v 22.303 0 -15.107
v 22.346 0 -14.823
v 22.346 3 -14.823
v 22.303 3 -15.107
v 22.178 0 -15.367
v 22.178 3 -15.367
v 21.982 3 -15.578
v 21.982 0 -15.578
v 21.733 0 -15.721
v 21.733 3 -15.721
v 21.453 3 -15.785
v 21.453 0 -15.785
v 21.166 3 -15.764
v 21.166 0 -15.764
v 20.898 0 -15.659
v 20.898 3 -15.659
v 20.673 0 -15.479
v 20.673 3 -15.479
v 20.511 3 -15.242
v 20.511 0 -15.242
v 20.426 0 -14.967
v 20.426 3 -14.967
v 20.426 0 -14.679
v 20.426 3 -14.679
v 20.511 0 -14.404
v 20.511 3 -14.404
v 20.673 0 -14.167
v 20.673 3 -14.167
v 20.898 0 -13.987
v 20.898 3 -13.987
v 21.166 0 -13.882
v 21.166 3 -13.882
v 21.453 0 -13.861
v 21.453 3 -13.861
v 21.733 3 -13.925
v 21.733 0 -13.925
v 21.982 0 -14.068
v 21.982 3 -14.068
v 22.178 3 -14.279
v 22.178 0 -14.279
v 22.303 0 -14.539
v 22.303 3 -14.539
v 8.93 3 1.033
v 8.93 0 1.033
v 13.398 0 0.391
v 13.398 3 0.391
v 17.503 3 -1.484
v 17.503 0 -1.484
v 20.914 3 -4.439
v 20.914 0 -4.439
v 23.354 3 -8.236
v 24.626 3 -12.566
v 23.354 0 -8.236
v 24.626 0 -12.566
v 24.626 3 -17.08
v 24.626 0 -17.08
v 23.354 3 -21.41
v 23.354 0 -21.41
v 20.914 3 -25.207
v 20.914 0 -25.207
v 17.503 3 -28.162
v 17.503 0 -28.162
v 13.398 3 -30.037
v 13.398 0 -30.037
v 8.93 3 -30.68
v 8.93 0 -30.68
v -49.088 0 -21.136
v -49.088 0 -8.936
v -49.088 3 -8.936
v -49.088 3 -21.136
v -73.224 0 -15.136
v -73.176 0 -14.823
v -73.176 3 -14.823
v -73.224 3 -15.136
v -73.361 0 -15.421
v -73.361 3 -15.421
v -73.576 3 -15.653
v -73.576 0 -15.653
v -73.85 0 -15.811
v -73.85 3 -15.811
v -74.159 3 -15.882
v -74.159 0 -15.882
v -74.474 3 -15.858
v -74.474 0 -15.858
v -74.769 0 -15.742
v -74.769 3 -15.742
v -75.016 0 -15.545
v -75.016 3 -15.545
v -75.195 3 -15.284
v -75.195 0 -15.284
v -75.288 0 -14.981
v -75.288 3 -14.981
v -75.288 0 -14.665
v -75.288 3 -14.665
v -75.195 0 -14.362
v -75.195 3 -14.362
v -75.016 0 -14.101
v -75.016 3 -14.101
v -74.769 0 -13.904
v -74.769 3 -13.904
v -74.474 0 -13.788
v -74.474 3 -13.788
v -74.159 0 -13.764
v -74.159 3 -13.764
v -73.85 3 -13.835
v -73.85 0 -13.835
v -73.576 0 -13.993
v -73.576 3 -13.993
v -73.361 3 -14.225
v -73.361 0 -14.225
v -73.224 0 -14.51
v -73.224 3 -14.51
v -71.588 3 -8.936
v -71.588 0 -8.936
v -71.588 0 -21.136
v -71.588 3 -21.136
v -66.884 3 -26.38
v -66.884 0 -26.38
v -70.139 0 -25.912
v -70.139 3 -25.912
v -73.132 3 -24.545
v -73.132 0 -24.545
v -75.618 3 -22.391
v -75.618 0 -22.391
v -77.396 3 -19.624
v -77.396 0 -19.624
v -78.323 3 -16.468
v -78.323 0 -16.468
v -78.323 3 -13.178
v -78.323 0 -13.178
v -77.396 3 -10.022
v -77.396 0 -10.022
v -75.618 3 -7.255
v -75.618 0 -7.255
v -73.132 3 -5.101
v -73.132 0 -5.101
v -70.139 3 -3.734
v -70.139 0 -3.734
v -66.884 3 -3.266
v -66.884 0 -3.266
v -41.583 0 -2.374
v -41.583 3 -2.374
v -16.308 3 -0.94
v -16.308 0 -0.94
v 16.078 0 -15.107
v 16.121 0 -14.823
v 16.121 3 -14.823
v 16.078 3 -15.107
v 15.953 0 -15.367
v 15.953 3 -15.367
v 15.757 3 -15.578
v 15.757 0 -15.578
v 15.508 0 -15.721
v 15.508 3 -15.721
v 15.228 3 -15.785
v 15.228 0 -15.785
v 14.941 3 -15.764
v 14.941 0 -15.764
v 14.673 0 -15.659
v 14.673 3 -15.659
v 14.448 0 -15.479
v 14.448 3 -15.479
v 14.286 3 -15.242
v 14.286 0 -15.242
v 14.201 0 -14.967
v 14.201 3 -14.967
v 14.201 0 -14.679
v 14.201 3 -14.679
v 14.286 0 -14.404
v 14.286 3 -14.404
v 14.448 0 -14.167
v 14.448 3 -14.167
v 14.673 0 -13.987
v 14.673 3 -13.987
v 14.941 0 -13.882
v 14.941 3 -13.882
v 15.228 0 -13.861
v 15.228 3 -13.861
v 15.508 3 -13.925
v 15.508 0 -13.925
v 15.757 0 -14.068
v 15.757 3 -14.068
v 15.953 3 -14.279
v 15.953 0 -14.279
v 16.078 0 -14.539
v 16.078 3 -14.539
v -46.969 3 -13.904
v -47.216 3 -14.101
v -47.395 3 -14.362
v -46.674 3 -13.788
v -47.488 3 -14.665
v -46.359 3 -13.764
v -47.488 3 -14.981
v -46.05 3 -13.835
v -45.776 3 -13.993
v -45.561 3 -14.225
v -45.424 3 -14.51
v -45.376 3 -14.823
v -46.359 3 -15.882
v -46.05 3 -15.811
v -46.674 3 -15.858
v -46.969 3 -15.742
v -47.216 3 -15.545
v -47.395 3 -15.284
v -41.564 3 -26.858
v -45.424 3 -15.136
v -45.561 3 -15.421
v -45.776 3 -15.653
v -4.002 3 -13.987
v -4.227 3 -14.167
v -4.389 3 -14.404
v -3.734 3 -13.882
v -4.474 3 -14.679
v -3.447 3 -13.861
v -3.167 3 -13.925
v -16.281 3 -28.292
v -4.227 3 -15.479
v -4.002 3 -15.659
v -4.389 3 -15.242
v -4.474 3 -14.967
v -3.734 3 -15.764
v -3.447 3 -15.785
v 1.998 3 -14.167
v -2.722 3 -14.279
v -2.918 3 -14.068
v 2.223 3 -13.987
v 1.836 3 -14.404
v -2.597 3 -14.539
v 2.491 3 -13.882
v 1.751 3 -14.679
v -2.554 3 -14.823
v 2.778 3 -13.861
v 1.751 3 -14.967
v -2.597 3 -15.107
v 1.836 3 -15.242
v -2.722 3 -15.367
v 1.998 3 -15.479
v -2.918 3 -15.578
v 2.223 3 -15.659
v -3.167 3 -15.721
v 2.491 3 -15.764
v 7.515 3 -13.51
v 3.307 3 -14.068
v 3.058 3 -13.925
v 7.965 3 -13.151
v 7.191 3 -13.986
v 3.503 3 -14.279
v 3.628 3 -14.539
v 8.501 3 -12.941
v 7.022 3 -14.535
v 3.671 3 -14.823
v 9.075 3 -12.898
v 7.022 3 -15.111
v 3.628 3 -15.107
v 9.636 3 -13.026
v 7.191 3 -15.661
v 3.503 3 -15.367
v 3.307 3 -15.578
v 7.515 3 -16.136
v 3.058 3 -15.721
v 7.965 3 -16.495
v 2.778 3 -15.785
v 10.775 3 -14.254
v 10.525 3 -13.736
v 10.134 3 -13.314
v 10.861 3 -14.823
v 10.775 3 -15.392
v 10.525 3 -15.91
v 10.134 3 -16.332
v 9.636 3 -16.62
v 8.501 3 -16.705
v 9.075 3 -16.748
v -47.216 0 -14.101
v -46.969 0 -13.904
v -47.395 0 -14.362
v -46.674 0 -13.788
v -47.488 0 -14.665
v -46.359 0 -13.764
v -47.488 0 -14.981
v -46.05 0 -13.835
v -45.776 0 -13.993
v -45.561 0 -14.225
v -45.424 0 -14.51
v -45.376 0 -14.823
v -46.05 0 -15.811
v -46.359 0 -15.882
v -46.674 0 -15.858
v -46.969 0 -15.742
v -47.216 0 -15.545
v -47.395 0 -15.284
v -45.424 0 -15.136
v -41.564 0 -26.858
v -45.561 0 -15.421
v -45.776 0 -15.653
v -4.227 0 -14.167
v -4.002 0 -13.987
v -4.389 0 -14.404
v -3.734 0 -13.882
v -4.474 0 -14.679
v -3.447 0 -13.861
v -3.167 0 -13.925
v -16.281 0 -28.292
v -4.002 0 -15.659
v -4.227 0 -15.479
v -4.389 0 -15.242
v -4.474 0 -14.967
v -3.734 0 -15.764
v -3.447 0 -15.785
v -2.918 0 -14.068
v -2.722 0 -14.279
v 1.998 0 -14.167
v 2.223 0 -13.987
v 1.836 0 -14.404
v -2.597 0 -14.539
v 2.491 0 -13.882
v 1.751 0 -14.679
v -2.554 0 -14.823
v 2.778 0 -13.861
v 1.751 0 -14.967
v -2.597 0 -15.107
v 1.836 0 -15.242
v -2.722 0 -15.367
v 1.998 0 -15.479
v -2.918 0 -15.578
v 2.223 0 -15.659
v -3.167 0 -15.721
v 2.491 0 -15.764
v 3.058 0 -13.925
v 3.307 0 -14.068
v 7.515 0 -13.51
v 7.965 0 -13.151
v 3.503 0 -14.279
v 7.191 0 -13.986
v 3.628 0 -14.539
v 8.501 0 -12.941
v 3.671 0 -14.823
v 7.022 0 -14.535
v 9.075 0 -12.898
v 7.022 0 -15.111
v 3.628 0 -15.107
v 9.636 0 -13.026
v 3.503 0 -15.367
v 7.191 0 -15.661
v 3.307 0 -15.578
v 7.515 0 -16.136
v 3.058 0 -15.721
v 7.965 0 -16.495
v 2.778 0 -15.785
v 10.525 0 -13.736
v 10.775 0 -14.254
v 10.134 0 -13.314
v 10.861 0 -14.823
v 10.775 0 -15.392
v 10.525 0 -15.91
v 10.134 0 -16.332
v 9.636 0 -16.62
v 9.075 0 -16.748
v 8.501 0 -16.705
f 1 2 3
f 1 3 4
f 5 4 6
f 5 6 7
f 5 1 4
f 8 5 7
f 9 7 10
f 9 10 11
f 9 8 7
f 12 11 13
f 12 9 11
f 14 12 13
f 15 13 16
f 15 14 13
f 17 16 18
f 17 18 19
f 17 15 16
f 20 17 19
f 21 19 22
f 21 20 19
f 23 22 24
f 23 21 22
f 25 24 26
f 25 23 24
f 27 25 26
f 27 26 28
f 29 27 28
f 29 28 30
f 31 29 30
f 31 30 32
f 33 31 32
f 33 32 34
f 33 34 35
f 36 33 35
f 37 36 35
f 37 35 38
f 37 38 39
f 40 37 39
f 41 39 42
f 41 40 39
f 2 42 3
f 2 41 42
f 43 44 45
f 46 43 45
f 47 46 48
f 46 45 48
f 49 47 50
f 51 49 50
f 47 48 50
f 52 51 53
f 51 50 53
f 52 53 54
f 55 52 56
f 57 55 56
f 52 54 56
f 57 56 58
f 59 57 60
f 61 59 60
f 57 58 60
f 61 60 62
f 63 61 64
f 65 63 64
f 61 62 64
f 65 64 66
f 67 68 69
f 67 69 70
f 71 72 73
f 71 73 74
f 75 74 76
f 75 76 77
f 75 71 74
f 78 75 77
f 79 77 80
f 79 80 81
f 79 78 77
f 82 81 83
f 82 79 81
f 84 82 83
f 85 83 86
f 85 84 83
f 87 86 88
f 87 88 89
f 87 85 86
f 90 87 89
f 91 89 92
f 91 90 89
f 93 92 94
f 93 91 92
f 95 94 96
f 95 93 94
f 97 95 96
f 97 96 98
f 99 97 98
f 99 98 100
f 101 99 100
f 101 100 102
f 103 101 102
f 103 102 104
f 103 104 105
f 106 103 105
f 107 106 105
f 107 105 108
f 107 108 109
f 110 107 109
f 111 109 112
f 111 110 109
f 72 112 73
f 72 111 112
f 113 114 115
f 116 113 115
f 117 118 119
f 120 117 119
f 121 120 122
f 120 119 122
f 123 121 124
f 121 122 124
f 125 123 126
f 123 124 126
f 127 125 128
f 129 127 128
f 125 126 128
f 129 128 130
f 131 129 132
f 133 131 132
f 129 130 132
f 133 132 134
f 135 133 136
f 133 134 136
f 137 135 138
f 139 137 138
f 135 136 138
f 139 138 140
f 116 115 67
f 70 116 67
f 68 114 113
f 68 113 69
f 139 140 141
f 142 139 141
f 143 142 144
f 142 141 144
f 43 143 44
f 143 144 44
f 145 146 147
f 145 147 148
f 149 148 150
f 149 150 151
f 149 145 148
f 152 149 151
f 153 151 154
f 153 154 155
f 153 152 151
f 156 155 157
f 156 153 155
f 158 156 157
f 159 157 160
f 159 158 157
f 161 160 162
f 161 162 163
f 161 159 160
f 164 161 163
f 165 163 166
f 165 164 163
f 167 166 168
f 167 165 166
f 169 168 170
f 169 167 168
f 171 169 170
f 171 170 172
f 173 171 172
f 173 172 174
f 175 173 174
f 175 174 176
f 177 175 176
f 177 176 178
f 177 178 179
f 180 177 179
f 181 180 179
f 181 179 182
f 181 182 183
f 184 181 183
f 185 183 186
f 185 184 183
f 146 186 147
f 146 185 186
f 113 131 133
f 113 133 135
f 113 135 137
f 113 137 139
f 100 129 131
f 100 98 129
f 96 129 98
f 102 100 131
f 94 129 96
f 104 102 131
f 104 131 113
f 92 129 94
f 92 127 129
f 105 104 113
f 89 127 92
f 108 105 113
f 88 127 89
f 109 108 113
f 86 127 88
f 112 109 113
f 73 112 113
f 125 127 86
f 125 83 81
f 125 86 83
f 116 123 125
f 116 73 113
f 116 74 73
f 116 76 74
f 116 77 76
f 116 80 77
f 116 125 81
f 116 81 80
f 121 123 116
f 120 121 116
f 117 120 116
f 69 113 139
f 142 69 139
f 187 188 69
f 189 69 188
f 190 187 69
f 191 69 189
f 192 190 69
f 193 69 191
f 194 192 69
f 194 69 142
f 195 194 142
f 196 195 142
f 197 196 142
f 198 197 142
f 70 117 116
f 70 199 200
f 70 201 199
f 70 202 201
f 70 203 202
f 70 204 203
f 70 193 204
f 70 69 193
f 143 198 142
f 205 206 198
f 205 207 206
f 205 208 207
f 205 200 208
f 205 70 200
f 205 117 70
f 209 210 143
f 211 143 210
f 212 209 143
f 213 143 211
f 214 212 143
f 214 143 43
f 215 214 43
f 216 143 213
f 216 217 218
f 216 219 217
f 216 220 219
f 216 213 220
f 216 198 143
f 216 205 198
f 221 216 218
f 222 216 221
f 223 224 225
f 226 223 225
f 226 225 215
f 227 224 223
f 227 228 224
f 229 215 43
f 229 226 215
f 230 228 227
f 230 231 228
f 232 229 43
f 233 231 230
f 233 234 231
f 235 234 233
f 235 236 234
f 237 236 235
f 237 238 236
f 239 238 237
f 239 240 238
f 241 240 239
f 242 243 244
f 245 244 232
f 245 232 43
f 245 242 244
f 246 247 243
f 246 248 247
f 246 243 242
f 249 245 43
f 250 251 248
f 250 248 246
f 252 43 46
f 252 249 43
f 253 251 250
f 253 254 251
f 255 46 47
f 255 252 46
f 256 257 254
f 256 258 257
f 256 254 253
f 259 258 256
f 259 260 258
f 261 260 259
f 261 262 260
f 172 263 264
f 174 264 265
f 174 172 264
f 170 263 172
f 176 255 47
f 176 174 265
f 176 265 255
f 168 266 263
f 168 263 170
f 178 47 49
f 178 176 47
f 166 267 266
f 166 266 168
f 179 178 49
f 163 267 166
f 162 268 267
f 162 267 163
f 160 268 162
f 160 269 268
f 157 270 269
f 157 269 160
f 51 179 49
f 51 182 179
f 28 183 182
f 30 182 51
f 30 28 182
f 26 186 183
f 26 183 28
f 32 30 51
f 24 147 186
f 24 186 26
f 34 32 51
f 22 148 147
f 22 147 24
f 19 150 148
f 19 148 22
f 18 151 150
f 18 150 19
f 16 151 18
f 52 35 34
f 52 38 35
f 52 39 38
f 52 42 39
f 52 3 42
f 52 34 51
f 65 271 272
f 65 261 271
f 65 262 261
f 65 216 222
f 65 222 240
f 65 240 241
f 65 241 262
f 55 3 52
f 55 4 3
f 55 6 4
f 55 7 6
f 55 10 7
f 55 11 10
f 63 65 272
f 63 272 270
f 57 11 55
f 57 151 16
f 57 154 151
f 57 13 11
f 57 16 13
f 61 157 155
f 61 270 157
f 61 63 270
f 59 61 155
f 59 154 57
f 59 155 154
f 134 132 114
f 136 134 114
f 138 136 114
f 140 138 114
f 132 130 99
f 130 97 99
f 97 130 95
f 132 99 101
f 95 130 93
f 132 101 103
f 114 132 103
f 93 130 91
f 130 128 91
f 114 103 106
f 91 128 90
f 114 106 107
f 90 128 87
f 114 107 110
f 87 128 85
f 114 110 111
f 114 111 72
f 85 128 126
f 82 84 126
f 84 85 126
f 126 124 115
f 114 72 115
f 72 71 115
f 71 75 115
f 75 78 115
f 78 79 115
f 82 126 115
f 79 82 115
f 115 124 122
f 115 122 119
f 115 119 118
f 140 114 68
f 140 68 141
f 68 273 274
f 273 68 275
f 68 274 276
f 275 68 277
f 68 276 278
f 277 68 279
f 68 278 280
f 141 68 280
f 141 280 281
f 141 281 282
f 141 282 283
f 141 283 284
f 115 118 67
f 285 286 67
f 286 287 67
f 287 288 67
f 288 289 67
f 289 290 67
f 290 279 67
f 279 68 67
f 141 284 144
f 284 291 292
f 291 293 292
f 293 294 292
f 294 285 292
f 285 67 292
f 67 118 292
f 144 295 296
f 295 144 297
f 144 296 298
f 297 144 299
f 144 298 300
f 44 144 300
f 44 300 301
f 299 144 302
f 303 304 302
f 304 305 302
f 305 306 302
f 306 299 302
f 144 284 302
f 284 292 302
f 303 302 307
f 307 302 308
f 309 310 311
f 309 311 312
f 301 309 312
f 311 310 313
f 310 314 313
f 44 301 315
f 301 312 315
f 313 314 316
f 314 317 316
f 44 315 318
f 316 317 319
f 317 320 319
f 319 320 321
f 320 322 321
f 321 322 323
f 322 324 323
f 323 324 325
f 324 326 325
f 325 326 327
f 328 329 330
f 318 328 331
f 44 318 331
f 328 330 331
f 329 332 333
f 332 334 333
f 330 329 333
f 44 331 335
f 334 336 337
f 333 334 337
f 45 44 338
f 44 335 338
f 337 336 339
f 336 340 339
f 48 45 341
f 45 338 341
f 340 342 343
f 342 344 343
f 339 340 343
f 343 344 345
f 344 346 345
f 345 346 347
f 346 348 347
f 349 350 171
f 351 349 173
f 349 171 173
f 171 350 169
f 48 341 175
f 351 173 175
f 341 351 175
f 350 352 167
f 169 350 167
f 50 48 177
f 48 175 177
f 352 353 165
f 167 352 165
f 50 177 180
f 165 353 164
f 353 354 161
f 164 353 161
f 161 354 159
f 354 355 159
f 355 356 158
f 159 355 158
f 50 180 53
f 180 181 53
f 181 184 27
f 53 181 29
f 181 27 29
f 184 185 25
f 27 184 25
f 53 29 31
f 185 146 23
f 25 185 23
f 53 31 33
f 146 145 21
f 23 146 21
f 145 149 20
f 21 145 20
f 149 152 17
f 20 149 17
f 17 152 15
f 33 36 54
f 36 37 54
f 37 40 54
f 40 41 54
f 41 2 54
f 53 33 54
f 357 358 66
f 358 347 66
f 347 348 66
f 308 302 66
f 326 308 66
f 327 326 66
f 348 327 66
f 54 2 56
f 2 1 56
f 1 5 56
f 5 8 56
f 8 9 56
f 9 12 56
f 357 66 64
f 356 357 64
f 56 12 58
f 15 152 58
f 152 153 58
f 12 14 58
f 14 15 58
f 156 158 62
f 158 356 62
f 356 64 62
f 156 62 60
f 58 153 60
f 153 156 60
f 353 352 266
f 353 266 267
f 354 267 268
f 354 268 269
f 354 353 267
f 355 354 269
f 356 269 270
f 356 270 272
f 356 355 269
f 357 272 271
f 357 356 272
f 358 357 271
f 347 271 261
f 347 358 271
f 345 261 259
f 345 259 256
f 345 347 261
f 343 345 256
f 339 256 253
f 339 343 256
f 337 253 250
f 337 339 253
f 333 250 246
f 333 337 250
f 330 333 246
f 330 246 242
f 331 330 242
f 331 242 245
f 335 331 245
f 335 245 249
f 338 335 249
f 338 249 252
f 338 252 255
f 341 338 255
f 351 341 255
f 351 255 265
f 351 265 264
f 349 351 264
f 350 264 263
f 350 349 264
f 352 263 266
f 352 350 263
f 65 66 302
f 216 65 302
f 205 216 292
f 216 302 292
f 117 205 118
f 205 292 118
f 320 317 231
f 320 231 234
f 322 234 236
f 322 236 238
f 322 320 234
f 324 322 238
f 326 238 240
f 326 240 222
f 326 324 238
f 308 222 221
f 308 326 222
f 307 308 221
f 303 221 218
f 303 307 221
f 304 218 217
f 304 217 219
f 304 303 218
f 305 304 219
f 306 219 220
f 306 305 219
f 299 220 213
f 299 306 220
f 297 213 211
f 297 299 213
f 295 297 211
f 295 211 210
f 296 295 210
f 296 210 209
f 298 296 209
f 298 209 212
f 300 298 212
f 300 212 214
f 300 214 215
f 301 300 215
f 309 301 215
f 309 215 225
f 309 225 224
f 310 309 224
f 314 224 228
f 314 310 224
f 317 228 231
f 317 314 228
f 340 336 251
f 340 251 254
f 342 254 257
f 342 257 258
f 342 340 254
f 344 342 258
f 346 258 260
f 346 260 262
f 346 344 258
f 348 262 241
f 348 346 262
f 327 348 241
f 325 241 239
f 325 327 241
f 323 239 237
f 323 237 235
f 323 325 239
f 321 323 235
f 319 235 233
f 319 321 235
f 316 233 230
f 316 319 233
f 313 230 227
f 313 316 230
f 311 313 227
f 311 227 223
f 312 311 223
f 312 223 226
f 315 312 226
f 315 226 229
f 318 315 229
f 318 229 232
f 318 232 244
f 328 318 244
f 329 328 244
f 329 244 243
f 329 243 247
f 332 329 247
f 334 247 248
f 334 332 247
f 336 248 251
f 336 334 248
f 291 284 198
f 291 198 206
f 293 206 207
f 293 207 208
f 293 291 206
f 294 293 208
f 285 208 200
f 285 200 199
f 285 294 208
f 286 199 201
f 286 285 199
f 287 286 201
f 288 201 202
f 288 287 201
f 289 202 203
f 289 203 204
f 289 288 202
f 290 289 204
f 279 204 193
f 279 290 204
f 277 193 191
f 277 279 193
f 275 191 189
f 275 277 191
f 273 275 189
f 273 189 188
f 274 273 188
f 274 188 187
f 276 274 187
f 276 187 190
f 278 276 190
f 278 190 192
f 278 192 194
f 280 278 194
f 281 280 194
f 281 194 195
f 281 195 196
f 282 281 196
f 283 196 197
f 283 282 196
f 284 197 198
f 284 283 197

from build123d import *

# Parameters (mm, degrees)
SKETCH1_R           = 1.93023
SKETCH1_R_2         = 1.061627907
SKETCH1_R_3         = 0.965116279
SKETCH1_R_4         = 0.96512
SKETCH1_W           = 22.5
SKETCH1_H           = 12.2
BOSS_EXTRUDE1_DEPTH = 3


with BuildPart() as part:
    # Sketch1 → Boss-Extrude1 (new body)
    with BuildSketch(Plane(origin=(0, 0, 0), x_dir=(1, 0, 0), z_dir=(0, 1, 0))):
        with BuildLine():
            ThreePointArc((-66.883539, 26.379856778), (-78.440375529, 14.823020249), (-66.883539, 3.26618372))
            ThreePointArc((-66.883539, 3.26618372), (-28.9420606, 1.724738168), (8.930411, -1.033473673))
            ThreePointArc((8.930411, -1.033473673), (24.786904692, 14.823020019), (8.930411, 30.679513711))
            ThreePointArc((8.930411, 30.679513711), (-28.915651041, 27.455633961), (-66.883539, 26.379856778))
        make_face()
        with Locations((8.930411, 14.823020019)):
            Circle(SKETCH1_R, mode=Mode.SUBTRACT)
        with Locations((-74.238049948, 14.823020249)):
            Circle(SKETCH1_R_2, mode=Mode.SUBTRACT)
        with Locations((-46.438049948, 14.823020249)):
            Circle(SKETCH1_R_2, mode=Mode.SUBTRACT)
        with Locations((2.705411, 14.823020019)):
            Circle(SKETCH1_R_3, mode=Mode.SUBTRACT)
        with Locations((-3.519589, 14.823020019)):
            Circle(SKETCH1_R_3, mode=Mode.SUBTRACT)
        with Locations((15.15541, 14.82302)):
            Circle(SKETCH1_R_4, mode=Mode.SUBTRACT)
        with Locations((21.380409, 14.823020019)):
            Circle(SKETCH1_R_4, mode=Mode.SUBTRACT)
        with Locations((-60.338049948, 15.035810946)):
            Rectangle(SKETCH1_W, SKETCH1_H, mode=Mode.SUBTRACT)
    extrude(amount=BOSS_EXTRUDE1_DEPTH)


solid = part.part
